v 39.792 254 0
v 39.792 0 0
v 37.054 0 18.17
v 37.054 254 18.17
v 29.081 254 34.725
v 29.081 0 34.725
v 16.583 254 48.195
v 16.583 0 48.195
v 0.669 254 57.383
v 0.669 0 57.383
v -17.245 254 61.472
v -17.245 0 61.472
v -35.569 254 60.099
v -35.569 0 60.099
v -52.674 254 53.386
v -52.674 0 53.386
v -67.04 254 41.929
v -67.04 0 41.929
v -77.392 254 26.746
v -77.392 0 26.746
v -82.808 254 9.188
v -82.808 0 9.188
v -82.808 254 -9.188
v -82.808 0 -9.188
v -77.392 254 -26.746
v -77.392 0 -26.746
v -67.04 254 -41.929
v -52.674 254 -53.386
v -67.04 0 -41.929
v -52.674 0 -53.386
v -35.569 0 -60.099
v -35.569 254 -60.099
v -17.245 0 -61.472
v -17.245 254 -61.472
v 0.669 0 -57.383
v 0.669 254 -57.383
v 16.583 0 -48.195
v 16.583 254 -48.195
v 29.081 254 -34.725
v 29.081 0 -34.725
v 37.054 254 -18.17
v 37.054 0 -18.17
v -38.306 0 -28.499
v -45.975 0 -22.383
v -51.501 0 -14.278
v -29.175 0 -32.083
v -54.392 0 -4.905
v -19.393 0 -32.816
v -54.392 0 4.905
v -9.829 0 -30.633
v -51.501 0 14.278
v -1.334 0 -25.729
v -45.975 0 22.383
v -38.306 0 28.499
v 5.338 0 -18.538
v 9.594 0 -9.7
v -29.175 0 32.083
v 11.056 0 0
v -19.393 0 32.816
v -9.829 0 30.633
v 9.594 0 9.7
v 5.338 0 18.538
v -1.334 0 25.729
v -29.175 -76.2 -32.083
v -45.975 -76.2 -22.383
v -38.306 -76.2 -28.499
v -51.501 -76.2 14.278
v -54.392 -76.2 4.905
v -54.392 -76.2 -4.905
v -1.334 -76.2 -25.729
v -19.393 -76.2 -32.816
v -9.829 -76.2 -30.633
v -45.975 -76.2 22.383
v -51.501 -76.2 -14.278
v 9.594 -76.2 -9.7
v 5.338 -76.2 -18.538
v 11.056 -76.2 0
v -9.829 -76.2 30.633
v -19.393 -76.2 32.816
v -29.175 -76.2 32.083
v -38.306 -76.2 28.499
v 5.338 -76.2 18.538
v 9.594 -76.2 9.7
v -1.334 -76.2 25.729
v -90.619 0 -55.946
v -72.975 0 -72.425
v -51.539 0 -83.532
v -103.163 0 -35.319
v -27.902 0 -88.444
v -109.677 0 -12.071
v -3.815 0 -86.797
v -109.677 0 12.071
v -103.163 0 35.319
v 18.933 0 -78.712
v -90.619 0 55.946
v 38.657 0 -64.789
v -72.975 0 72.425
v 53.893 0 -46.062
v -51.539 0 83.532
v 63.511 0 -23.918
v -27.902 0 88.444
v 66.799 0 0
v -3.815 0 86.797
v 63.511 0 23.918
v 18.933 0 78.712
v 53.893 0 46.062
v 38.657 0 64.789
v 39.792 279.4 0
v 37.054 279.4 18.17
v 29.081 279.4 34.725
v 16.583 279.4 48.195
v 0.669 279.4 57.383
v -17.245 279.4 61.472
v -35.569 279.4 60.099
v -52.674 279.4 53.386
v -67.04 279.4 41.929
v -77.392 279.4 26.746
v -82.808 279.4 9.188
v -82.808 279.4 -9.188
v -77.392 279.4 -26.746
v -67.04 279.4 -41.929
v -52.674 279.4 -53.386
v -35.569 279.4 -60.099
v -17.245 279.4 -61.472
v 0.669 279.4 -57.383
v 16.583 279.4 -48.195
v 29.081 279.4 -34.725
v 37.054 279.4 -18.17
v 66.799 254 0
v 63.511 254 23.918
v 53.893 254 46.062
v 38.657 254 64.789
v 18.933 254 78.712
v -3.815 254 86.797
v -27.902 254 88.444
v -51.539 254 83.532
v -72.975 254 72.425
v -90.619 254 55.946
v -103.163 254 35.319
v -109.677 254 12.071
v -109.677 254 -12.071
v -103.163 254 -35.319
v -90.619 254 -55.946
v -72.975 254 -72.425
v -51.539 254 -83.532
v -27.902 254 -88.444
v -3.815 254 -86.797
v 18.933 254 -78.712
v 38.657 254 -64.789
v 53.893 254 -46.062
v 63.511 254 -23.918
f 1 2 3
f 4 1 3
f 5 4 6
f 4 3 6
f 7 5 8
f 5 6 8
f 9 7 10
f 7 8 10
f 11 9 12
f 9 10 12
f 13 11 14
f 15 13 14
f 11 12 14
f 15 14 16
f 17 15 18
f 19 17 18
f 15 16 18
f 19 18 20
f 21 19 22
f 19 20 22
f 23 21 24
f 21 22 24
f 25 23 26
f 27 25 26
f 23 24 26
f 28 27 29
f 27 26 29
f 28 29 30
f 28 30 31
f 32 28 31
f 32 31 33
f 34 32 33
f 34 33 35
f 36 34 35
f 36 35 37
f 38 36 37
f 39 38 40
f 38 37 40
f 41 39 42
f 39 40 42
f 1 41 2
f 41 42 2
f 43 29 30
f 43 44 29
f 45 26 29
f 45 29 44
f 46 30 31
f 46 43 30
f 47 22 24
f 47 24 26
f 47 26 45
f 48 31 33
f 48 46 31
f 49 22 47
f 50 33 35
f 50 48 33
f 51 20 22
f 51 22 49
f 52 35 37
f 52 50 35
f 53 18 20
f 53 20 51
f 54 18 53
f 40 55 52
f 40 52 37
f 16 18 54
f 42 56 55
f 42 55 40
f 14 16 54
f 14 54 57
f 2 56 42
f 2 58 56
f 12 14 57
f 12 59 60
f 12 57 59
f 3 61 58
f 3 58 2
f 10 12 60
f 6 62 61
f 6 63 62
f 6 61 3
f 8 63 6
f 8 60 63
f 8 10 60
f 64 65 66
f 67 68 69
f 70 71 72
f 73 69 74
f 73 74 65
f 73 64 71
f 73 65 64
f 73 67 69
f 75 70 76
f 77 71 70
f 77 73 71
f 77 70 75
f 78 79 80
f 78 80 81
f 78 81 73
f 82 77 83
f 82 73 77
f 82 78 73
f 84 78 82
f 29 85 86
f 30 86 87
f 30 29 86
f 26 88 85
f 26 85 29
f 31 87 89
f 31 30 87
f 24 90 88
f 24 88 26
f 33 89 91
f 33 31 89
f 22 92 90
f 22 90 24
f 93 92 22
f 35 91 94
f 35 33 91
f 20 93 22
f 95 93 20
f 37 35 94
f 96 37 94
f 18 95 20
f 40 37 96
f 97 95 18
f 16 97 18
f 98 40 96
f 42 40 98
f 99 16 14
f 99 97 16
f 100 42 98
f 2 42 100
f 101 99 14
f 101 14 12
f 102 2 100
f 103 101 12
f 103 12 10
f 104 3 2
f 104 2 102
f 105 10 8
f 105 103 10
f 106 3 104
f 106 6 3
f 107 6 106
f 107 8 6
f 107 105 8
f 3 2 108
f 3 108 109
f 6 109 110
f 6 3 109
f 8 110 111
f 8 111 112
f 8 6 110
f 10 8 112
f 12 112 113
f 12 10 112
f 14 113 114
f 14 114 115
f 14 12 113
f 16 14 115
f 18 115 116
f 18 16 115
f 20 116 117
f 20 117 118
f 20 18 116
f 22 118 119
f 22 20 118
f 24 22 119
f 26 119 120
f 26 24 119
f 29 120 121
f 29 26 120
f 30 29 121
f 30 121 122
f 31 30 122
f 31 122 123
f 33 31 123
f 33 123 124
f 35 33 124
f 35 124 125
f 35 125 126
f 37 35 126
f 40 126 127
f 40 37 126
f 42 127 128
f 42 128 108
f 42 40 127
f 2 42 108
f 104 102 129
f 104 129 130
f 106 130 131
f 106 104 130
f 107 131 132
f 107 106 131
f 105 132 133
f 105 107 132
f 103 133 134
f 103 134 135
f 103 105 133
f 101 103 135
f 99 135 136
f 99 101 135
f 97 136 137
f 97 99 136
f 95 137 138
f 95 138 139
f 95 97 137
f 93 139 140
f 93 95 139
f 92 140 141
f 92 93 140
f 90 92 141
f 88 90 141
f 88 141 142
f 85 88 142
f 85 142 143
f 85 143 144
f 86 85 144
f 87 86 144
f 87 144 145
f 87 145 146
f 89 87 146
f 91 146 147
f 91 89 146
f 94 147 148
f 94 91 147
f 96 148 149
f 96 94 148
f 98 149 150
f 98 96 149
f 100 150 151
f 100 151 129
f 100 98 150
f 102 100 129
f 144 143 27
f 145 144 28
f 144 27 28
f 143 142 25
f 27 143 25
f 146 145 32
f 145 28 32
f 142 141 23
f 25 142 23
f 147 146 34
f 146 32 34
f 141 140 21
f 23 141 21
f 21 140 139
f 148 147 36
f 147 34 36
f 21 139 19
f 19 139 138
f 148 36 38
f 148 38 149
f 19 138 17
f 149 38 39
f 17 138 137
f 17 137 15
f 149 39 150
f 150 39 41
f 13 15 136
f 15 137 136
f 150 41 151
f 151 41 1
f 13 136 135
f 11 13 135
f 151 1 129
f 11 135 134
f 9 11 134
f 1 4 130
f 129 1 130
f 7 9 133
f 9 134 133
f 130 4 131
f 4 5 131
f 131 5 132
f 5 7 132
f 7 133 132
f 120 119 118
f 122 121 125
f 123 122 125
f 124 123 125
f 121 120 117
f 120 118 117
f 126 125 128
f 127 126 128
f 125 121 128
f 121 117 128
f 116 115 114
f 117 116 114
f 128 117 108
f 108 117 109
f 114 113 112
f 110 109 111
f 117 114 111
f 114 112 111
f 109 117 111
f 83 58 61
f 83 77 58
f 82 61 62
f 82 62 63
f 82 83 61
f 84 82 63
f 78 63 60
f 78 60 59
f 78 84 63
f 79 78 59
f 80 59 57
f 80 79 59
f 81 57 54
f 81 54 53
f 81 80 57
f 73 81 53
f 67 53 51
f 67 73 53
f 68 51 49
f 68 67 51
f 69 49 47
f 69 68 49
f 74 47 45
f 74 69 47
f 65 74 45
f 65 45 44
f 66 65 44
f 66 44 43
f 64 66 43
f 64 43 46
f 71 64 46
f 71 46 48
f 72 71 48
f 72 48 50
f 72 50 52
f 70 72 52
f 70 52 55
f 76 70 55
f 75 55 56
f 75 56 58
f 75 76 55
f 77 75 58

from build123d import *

# Parameters (mm, degrees)
F0_R          = 32.908074
F1_DEPTH      = 76.2
F1_DEPTH_BACK = 279.4
F0_R_2        = 61.644307
F2_DEPTH      = 279.4
F0_R_3        = 88.650797
F3_DEPTH      = 254


with BuildPart() as f1:
    # F0 (on Front) → F1 (new body, two sides)
    with BuildSketch(Plane.XZ) as f1_sk:
        with Locations((-21.851949, 0)):
            Circle(F0_R)
    extrude(amount=F1_DEPTH)
    extrude(f1_sk.sketch, amount=-F1_DEPTH_BACK)

    # F0 (on Front) → F2 (join)
    with BuildSketch(Plane.XZ):
        with Locations((-21.851949, 0)):
            Circle(F0_R_2)
        with Locations((-21.851949, 0)):
            Circle(F0_R, mode=Mode.SUBTRACT)
    extrude(amount=-F2_DEPTH)


with BuildPart() as f3:
    # F0 (on Front) → F3 (new body)
    with BuildSketch(Plane.XZ):
        with Locations((-21.851949, 0)):
            Circle(F0_R_3)
        with Locations((-21.851949, 0)):
            Circle(F0_R_2, mode=Mode.SUBTRACT)
    extrude(amount=-F3_DEPTH)


solid = Compound([f1.part, f3.part])
